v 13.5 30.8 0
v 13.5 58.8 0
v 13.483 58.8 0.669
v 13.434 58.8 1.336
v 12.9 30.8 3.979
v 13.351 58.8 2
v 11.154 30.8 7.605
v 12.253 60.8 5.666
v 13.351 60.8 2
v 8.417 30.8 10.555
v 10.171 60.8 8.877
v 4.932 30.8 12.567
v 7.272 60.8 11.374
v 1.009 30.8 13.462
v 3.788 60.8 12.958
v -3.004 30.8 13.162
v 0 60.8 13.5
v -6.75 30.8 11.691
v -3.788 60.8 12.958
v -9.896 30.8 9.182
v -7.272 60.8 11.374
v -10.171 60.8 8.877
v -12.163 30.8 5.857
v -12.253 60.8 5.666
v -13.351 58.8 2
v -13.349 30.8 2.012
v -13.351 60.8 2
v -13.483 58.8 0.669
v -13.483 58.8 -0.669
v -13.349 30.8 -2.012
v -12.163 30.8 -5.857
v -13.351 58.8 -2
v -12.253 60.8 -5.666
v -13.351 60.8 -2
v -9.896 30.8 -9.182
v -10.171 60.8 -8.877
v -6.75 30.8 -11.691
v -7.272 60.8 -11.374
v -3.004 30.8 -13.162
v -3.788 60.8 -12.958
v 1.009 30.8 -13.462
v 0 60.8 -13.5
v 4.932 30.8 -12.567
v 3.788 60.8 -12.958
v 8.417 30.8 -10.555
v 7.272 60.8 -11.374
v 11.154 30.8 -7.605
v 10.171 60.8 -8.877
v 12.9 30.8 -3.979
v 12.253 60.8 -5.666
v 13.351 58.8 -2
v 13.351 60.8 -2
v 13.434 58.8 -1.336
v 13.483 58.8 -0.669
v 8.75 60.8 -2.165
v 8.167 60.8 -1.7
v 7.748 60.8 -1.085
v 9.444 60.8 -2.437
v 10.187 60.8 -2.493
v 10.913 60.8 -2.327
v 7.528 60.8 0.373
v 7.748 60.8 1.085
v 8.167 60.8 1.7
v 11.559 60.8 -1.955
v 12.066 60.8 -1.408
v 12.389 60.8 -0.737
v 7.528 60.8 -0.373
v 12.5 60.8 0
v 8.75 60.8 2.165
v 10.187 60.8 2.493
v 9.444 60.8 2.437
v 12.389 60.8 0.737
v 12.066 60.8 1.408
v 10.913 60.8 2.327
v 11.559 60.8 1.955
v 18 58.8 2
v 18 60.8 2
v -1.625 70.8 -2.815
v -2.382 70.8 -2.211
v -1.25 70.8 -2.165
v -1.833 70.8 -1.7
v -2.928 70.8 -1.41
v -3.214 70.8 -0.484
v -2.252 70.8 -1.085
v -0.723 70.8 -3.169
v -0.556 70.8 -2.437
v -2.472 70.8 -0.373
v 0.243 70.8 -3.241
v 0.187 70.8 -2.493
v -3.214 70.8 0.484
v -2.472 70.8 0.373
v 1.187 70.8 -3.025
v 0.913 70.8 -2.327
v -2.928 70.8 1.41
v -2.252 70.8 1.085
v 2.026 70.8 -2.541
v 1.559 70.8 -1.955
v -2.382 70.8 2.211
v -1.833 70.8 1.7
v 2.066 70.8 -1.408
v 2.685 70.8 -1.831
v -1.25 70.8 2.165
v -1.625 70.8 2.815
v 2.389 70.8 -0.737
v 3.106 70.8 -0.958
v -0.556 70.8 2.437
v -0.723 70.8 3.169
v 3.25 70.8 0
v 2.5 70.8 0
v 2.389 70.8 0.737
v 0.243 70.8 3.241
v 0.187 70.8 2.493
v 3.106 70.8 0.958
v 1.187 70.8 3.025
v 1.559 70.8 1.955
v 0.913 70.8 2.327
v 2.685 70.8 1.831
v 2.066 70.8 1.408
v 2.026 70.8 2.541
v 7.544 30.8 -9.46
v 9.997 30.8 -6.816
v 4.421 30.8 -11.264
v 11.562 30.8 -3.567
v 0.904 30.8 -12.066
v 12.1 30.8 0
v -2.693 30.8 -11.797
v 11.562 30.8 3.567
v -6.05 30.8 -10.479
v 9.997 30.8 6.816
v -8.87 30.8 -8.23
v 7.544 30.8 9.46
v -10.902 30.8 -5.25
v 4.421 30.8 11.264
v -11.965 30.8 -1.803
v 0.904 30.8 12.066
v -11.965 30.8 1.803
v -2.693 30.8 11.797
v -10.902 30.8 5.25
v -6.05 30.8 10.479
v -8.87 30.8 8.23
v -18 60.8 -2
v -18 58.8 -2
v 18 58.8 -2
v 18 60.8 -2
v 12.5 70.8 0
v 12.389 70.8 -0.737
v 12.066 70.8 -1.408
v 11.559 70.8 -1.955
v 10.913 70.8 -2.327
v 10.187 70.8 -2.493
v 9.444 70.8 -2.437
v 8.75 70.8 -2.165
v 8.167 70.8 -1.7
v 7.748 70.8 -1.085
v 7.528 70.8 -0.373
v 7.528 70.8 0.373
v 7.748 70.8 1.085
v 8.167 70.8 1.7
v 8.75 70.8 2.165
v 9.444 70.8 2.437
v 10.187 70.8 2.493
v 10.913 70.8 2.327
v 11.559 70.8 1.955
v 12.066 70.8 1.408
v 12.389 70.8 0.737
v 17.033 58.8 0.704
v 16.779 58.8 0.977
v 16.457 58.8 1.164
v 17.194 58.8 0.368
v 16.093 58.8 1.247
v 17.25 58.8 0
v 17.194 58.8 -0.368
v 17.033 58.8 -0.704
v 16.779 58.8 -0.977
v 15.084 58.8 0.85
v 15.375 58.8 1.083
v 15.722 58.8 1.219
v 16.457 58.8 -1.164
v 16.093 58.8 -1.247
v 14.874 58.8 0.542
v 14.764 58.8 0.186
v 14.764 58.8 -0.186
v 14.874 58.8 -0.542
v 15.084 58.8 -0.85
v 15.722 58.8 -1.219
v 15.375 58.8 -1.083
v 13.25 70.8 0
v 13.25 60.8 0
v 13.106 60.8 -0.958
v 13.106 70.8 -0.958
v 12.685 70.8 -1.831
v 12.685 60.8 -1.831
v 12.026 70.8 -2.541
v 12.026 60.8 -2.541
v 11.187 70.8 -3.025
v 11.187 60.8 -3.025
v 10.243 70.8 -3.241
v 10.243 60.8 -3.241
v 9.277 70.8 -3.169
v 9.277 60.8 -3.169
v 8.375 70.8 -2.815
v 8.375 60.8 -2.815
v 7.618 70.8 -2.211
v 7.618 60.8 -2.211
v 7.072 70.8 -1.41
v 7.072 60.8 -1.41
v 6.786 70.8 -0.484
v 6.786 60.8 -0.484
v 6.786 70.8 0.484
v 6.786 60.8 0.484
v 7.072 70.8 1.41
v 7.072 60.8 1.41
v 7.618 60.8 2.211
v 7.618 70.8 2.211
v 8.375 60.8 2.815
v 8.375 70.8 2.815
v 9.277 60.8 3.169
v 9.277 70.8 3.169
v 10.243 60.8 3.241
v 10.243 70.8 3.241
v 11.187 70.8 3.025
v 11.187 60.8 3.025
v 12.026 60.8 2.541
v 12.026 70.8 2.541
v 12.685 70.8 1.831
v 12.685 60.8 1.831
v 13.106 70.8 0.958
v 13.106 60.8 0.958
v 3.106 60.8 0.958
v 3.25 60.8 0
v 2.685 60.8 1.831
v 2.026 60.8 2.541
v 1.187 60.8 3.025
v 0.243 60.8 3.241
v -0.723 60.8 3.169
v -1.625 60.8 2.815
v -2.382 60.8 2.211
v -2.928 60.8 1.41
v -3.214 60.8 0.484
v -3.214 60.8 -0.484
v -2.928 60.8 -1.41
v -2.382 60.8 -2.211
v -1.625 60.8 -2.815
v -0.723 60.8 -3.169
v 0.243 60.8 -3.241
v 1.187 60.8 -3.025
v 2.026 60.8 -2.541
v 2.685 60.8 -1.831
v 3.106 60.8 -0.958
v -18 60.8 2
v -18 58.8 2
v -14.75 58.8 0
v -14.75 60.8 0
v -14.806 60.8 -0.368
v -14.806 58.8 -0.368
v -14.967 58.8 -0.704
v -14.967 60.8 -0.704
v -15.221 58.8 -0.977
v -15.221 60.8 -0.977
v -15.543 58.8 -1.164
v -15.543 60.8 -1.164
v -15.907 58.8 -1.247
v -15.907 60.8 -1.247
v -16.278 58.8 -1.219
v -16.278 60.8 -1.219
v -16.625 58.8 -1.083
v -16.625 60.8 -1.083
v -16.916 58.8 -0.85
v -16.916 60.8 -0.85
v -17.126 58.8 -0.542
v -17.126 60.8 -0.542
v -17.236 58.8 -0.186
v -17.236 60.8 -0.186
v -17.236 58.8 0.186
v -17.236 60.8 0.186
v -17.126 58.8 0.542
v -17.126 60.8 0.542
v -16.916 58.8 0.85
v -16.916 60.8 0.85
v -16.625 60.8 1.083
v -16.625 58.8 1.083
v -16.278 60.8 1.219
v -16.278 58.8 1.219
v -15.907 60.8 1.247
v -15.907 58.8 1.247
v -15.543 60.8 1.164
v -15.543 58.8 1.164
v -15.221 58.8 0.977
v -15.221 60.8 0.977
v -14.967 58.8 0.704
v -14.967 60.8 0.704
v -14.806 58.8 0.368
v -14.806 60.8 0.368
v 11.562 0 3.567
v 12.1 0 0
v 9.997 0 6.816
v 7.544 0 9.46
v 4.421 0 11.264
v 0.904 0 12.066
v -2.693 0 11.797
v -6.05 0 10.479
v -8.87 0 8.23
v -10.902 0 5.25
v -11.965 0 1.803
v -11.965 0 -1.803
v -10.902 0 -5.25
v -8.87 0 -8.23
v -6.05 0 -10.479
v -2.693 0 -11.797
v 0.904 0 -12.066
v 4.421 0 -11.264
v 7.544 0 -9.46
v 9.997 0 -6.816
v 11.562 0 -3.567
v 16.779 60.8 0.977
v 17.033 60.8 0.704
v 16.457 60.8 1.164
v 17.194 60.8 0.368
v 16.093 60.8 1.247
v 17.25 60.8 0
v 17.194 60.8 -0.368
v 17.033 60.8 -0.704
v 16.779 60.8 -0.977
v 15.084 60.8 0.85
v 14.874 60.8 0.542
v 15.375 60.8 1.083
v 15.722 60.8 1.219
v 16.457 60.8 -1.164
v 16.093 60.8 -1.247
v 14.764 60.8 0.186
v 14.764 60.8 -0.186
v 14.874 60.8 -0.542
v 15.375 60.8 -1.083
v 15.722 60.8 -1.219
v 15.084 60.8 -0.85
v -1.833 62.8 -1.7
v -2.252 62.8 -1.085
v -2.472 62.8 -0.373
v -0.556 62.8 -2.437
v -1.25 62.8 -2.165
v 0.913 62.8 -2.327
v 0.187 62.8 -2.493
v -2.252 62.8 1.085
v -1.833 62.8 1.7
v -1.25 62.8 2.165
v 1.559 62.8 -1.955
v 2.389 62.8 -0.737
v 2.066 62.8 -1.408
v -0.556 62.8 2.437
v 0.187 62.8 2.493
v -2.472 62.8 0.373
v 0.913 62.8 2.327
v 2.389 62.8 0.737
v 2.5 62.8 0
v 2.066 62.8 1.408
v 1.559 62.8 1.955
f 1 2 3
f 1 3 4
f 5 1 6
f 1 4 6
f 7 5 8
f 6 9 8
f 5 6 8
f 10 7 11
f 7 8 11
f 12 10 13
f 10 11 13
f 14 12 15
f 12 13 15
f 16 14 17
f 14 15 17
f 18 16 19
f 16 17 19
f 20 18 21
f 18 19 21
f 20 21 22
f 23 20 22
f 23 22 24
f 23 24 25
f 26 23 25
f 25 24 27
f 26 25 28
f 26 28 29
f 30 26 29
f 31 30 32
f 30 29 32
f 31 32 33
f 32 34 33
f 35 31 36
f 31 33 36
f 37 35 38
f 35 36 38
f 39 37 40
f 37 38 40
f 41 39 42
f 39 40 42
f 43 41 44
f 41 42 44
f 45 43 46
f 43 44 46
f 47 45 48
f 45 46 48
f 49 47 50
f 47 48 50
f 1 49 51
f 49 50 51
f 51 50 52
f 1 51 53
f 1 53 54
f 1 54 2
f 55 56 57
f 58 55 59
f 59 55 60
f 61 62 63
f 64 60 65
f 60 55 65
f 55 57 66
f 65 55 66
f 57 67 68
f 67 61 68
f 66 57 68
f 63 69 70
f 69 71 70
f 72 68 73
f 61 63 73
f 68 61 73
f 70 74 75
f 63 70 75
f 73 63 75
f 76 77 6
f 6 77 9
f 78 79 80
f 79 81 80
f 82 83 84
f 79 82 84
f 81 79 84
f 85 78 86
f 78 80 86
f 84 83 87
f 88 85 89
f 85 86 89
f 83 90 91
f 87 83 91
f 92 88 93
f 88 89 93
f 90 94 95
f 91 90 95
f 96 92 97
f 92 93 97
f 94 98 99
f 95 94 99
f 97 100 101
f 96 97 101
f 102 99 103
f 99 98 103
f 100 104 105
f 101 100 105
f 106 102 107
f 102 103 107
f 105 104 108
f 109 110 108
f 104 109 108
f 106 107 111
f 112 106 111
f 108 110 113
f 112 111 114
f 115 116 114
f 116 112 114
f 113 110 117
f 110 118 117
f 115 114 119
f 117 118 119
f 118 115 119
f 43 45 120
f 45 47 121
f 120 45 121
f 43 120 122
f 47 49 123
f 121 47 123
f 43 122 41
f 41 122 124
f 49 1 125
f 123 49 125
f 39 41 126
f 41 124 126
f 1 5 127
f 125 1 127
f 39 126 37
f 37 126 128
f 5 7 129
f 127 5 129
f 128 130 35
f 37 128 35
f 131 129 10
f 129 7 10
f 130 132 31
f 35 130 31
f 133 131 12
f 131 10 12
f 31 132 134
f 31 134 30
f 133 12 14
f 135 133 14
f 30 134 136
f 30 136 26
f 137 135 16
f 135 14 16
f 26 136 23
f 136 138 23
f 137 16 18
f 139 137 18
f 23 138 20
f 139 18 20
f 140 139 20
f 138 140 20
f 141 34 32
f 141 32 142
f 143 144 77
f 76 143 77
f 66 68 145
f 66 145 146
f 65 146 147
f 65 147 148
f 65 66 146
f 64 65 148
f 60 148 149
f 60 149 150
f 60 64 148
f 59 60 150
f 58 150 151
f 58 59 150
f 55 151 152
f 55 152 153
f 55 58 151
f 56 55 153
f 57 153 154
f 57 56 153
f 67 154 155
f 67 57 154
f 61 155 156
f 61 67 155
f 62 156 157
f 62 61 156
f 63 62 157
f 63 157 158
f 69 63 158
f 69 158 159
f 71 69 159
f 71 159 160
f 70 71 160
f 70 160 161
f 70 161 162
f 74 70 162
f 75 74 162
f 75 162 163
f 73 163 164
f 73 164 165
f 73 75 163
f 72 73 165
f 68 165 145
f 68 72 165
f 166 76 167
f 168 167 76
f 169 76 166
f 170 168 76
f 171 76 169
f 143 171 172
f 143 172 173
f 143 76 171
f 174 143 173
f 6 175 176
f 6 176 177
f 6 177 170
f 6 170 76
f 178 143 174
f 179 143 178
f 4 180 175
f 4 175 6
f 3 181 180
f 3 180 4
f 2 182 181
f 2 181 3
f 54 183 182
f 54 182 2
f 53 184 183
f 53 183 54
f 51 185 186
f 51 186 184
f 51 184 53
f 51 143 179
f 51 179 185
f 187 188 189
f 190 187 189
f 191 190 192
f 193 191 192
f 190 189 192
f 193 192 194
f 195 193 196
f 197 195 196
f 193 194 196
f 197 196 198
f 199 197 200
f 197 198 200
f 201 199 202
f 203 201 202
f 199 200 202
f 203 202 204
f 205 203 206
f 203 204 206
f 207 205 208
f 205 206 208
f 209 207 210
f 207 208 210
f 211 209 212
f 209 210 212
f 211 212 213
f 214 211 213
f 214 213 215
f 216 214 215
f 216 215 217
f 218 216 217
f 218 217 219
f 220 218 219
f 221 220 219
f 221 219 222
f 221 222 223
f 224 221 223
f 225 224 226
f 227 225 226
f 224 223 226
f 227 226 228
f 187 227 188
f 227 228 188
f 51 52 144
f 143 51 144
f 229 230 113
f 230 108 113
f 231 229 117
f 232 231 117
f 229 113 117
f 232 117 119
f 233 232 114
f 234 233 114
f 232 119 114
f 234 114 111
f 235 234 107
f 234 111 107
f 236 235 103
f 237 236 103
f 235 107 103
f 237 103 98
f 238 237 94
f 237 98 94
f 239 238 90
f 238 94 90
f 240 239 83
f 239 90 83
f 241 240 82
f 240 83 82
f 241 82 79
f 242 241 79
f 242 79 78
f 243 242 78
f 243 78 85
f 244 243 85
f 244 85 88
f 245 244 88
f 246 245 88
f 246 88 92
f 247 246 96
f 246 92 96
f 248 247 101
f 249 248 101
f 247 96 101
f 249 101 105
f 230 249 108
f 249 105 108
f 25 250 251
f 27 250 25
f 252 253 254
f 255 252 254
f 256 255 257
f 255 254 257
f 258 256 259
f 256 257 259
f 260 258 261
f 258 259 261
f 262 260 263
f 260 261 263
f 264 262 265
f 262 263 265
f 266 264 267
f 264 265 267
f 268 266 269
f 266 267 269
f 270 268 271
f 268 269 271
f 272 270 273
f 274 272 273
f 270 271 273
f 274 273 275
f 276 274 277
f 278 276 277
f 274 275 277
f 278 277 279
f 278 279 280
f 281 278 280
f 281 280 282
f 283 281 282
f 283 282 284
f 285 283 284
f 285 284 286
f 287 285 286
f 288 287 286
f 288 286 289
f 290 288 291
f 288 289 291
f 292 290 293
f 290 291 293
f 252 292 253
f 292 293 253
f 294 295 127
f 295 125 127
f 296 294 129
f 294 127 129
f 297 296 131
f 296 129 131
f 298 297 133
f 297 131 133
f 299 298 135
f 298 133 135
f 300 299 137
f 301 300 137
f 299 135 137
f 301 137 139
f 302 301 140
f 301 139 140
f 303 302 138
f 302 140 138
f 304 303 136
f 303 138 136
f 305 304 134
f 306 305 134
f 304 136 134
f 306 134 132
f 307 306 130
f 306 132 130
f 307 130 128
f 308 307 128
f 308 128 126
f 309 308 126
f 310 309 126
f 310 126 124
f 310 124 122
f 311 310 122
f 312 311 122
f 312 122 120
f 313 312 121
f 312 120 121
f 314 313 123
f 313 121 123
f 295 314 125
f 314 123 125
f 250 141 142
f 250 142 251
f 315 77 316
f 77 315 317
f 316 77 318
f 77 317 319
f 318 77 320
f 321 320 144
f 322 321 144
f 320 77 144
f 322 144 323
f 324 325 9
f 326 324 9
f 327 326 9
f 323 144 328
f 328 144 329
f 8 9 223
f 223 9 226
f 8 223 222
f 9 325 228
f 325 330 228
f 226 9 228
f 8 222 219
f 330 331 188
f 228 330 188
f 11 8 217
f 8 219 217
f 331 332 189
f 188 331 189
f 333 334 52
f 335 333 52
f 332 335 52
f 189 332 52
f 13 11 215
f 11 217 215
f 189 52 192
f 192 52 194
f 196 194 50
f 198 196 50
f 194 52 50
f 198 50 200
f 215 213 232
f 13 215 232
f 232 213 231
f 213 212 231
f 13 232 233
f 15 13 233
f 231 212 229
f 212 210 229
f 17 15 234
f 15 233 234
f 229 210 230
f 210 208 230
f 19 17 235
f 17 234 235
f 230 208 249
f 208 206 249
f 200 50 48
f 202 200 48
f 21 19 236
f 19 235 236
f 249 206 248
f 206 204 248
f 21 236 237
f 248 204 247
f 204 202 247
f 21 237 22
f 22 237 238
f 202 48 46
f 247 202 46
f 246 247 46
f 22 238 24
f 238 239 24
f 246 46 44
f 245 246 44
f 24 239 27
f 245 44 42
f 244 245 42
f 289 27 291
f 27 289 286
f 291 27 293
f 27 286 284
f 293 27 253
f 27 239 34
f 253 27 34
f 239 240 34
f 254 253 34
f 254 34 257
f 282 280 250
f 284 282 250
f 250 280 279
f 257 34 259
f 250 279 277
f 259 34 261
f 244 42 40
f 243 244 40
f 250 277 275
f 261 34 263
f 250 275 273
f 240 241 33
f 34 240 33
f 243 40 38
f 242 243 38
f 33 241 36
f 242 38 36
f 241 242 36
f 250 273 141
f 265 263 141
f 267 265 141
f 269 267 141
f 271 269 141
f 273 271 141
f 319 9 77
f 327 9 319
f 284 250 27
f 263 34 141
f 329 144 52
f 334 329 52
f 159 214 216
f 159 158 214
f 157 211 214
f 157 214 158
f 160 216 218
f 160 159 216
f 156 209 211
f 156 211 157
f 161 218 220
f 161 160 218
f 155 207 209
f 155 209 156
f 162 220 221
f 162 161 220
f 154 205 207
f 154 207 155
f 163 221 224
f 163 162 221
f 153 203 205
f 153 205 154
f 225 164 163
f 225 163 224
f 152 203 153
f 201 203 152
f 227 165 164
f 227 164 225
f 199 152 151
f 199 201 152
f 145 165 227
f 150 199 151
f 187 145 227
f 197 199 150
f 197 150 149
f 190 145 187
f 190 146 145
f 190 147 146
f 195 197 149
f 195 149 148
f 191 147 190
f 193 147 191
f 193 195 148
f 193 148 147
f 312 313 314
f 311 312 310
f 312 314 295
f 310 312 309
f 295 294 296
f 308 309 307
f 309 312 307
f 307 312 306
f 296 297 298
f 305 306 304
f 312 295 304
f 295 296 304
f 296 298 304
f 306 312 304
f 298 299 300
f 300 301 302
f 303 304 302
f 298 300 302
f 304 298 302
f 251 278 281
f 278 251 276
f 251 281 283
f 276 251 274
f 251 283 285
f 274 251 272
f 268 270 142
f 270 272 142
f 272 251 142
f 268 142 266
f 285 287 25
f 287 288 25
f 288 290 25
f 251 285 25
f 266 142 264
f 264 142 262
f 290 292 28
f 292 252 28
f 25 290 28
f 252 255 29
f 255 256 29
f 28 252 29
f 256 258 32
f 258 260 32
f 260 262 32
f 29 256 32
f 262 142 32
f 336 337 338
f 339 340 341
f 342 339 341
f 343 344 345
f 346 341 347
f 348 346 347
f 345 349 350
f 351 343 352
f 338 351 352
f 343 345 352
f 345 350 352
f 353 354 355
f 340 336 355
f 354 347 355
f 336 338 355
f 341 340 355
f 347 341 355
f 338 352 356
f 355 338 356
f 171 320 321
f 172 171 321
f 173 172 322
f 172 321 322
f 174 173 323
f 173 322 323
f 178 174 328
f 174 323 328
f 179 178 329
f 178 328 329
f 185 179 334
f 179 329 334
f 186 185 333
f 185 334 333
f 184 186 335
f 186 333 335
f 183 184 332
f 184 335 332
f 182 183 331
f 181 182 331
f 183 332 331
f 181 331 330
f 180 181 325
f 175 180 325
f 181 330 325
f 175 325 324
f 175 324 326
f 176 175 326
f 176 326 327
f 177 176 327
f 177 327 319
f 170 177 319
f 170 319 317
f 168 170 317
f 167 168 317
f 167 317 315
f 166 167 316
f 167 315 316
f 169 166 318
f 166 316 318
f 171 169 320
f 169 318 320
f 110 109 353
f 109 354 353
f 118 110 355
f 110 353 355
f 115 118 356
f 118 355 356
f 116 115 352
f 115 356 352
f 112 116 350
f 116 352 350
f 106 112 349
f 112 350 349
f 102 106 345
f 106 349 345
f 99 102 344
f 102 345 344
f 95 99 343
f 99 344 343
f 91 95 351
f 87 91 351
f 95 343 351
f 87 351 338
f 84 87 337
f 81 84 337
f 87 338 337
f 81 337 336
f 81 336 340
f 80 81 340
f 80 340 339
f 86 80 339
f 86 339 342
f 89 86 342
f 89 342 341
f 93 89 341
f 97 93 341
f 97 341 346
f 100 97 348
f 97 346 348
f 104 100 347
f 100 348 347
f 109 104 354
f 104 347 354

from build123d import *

# Parameters (mm, degrees)
SKIZZE2_R                       = 3.25
SKIZZE2_R_2                     = 2.5
AUFSATZ_LINEAR_AUSTRAGEN1_DEPTH = 10
SKIZZE3_R                       = 1.25
AUFSATZ_LINEAR_AUSTRAGEN2_DEPTH = 2


with BuildPart() as part:
    # Skizze1 → Rotation1 (revolve)
    with BuildSketch(Plane.XY):
        Polygon((0, 0), (12.1, 0), (12.1, 30.8), (13.5, 30.8), (13.5, 60.8), (3.25, 60.8), (3.25, 70.8), (2.5, 70.8), (2.5, 62.8), (0, 62.8), align=None)
    revolve(axis=Axis((0, 12.380405046, 0), (0, -1, 0)))

    # Skizze2 → Aufsatz-Linear austragen1 (add)
    with BuildSketch(Plane(origin=(0, 60.8, 0), x_dir=(1, 0, 0), z_dir=(0, 1, 0))):
        with Locations((10, 0)):
            Circle(SKIZZE2_R)
        with Locations((10, 0)):
            Circle(SKIZZE2_R_2, mode=Mode.SUBTRACT)
    extrude(amount=AUFSATZ_LINEAR_AUSTRAGEN1_DEPTH)

    # Skizze3 → Aufsatz-Linear austragen2 (add)
    with BuildSketch(Plane(origin=(0, 60.8, 0), x_dir=(1, 0, 0), z_dir=(0, 1, 0))):
        with BuildLine():
            Line((-13.351029923, 2), (-18, 2))
            Line((-18, 2), (-18, -2))
            Line((-18, -2), (-13.351029923, -2))
            ThreePointArc((-13.351029923, -2), (-13.5, 0), (-13.351029923, 2))
        make_face()
        with Locations((-16, 0)):
            Circle(SKIZZE3_R, mode=Mode.SUBTRACT)
        with BuildLine():
            Line((18, -2), (13.351029923, -2))
            ThreePointArc((13.351029923, -2), (13.5, 0), (13.351029923, 2))
            Line((13.351029923, 2), (18, 2))
            Line((18, 2), (18, -2))
        make_face()
        with Locations((16, 0)):
            Circle(SKIZZE3_R, mode=Mode.SUBTRACT)
    extrude(amount=-AUFSATZ_LINEAR_AUSTRAGEN2_DEPTH)


solid = part.part
